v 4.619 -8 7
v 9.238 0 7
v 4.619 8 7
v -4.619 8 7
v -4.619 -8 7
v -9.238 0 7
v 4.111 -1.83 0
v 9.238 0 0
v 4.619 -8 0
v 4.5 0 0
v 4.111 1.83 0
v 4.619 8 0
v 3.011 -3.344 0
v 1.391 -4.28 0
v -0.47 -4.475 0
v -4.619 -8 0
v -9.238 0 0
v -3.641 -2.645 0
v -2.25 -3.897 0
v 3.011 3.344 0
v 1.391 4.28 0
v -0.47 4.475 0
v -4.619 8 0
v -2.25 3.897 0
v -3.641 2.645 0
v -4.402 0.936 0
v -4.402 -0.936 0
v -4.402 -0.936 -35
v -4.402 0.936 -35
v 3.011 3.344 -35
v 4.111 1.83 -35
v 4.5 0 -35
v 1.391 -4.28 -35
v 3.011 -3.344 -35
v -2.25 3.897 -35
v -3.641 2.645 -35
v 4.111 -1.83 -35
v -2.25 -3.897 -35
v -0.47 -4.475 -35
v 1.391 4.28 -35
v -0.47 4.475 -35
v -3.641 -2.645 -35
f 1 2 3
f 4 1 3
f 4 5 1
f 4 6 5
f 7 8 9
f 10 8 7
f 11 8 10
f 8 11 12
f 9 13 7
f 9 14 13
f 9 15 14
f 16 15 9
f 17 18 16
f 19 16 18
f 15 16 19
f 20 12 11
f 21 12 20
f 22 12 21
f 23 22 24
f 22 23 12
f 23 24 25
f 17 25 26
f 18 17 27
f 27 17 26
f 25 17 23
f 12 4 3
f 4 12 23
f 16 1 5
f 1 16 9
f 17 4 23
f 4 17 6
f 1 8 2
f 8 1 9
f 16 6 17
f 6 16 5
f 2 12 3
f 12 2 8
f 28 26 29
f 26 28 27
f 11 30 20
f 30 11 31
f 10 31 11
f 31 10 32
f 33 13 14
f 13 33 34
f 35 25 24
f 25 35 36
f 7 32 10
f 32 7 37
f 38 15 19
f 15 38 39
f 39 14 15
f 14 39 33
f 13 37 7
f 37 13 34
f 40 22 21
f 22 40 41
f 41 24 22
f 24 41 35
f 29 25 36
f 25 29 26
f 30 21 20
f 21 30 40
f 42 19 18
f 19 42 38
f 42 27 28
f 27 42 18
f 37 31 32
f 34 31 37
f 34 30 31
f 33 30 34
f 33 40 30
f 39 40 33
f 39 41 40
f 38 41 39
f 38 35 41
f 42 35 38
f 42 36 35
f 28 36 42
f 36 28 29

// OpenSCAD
// ========================================================
// Parametric Standard Hex Bolt
// ========================================================

// Core Dimensions
shaft_radius = 4.5;    // M9 Thread equivalent
shaft_length = 35;     // Shaft length
head_flats = 16;       // Width across flats of hex head
head_thickness = 7;    // Bolt head height

// Module to construct a perfect regular hexagon via box intersection
module hex_head(width, height) {
    // Length across corners is width * 1.1547 (2 / sqrt(3))
    len = width * 1.1547;
    
    intersection() {
        cube([len, width, height], center=true);
        
        rotate([0, 0, 60])
            cube([len, width, height], center=true);
            
        rotate([0, 0, 120])
            cube([len, width, height], center=true);
    }
}

// Assemble the complete bolt
union() {
    // Hex Head placed on top
    translate([0, 0, head_thickness / 2]) {
        hex_head(head_flats, head_thickness);
    }
    
    // Cylinder Shaft extending downwards
    translate([0, 0, -shaft_length / 2]) {
        cylinder(h=shaft_length, r=shaft_radius, center=true);
    }
}
